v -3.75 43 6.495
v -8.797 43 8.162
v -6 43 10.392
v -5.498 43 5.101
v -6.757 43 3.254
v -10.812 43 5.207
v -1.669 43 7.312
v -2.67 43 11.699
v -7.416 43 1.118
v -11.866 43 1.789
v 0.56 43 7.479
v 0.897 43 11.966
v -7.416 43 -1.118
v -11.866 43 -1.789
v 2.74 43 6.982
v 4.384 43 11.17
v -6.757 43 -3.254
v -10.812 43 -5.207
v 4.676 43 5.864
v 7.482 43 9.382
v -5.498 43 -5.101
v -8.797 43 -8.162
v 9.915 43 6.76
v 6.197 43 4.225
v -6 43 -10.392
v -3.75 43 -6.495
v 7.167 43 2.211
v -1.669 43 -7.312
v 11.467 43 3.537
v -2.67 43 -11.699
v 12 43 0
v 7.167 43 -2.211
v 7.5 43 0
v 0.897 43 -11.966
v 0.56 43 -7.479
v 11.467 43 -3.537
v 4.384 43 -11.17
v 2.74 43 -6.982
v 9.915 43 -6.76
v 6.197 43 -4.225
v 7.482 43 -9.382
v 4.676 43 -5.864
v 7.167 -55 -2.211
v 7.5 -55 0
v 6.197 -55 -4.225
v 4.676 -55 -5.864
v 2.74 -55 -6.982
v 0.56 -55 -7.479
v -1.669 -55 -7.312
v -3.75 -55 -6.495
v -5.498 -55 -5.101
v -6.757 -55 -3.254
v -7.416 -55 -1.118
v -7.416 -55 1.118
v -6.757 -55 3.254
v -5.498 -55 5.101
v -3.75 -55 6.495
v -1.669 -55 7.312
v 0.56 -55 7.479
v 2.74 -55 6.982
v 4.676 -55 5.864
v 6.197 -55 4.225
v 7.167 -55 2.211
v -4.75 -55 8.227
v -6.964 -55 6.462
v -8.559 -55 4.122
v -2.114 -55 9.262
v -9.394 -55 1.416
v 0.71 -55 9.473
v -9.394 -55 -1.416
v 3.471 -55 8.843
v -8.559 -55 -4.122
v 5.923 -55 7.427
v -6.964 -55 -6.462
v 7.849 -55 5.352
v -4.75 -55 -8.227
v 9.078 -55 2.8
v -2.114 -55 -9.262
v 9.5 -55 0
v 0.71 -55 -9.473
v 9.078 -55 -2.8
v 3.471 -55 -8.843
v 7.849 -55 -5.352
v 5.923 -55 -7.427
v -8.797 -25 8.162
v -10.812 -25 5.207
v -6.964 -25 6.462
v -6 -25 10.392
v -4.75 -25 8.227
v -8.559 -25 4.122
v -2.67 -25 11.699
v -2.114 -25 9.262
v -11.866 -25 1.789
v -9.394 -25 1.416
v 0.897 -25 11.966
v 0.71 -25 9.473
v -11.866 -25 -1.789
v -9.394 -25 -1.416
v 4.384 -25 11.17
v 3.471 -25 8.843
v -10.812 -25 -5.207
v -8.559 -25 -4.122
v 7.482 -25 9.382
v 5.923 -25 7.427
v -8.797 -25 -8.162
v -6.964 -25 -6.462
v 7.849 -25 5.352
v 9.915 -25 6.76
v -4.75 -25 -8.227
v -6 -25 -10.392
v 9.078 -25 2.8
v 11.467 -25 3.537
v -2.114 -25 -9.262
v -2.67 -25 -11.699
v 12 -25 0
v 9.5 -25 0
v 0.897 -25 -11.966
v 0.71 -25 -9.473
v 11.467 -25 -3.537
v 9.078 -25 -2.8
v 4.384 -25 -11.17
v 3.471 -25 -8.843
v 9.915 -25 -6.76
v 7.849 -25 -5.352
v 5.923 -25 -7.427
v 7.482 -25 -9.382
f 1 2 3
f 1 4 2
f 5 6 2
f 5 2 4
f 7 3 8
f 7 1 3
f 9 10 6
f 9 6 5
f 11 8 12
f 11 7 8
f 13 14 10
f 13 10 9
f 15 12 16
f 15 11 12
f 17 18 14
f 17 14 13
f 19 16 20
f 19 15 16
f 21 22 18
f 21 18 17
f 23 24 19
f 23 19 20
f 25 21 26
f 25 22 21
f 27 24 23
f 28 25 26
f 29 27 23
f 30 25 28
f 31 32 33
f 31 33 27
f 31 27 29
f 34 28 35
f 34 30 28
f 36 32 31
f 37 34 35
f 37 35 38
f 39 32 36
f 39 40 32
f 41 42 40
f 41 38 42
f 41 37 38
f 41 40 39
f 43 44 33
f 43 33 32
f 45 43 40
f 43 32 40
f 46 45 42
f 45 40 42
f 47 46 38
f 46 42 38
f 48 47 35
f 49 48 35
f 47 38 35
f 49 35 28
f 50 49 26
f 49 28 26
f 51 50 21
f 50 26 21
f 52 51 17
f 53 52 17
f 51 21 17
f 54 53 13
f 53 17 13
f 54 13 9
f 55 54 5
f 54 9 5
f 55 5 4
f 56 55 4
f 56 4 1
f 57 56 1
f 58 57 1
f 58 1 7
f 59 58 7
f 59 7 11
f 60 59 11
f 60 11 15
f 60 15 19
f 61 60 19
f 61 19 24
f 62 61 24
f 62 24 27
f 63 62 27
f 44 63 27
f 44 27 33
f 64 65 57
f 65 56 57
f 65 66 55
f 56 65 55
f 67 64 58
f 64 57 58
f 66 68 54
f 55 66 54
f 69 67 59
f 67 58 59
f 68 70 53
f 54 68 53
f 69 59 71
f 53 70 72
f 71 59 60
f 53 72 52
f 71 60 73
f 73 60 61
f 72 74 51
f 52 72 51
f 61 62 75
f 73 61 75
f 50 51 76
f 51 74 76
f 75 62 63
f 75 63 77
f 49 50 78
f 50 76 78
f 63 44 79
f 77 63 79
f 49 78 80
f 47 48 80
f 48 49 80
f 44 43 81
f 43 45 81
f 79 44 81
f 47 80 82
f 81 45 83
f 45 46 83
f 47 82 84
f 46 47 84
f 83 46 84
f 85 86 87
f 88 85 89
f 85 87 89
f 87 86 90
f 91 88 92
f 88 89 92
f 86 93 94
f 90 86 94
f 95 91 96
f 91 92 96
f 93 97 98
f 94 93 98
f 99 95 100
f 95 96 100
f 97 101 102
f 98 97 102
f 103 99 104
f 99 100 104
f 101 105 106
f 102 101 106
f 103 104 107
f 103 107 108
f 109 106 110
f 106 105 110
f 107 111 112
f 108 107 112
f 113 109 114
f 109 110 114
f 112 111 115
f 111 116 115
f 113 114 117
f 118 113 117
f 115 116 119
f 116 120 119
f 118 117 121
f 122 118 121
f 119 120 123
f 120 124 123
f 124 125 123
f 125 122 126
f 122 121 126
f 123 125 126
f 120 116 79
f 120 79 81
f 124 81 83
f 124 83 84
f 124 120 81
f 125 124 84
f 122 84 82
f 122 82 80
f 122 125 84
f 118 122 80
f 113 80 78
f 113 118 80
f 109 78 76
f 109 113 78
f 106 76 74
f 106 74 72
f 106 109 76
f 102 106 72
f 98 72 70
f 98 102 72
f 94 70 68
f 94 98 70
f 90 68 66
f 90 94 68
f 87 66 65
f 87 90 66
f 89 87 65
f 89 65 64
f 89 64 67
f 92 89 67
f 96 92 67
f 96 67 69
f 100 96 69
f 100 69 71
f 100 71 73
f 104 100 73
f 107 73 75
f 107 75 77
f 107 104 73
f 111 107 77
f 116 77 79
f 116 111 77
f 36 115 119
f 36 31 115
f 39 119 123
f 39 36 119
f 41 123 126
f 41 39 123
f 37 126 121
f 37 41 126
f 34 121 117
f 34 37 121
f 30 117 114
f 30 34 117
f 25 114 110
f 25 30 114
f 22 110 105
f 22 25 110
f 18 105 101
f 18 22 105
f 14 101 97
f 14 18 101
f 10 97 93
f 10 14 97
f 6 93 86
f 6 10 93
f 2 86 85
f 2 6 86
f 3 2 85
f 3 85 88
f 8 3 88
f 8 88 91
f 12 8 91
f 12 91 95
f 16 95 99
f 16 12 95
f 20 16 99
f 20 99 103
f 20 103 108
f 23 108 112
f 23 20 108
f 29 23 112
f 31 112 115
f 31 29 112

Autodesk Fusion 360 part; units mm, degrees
sketch "Sketch1" plane through (0, 0, 0) normal (0, 1, 0) x (1, 0, 0)
  circle A0 centre (0, 0) radius 12
  circle A1 centre (0, 0) radius 7.5
  circle A2 centre (0, 0) radius 9.5
extrude "Extrude1" add sketch "Sketch1" along normal blind 45 contours A0 | A2
extrude "Extrude2" add sketch "Sketch1" against normal blind 25 contours A2
extrude "Extrude3" add sketch "Sketch1" against normal blind 11 contours A0
extrude "Extrude4" add 1 faces at (8.77, -25, 0.8446) along direction (0, -1, 0) blind 16
extrude "Extrude5" add 1 faces at (11.0866, -11, 1.0681) along direction (0, -1, 0) blind 14
extrude "Extrude6" add 1 faces at (8.77, -41, 0.8446) along direction (0, -1, 0) blind 14
extrude "Extrude8" cut 1 faces at (10.4274, 45, 0.9688) along direction (0, -1, 0) blind 2
extrude "Extrude7" [suppressed]
